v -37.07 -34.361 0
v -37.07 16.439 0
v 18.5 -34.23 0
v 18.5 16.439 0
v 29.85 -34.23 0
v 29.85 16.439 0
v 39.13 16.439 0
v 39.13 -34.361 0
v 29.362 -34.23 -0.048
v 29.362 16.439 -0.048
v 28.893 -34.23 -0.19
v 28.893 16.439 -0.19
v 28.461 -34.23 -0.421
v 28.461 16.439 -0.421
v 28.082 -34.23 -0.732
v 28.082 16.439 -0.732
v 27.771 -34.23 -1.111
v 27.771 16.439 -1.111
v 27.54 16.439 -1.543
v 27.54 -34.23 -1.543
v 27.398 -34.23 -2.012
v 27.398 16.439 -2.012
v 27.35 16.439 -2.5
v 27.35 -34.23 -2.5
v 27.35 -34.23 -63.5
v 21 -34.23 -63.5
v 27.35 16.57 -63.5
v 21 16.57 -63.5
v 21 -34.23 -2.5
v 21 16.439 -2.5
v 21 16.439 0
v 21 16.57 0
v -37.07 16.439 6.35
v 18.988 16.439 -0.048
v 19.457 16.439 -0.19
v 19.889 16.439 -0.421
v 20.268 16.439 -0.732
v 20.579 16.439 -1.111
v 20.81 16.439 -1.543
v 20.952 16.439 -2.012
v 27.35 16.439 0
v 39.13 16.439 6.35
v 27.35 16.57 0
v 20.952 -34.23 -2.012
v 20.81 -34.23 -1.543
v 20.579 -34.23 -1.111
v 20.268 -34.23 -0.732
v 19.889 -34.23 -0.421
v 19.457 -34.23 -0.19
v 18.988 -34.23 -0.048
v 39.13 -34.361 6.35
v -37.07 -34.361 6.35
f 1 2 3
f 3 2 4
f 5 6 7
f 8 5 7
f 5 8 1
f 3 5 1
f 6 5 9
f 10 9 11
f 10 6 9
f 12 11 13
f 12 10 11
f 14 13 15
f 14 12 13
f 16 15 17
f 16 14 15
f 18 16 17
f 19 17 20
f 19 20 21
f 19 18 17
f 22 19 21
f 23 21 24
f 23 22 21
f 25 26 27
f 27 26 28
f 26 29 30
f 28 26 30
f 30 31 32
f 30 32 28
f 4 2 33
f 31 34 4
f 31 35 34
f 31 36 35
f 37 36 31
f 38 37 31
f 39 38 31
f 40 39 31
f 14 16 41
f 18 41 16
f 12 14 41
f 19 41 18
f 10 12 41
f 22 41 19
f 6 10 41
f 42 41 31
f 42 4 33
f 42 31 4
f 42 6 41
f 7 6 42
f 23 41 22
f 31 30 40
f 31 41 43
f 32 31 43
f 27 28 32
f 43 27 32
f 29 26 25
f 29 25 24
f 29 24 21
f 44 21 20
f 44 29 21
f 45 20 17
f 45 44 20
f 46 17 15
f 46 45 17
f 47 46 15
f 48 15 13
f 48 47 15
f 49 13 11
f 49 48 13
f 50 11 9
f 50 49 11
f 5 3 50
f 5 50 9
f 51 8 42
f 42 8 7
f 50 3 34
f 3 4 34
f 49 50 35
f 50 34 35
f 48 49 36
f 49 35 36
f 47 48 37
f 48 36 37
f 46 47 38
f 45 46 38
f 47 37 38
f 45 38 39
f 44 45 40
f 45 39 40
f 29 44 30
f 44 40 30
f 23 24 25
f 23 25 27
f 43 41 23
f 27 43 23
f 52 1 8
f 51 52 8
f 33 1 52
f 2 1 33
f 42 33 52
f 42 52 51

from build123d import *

# Parameters (mm, degrees)
F0_W     = 76.2
F0_H     = 50.8
F1_DEPTH = 6.35
F3_W     = 50.8
F3_H     = 63.5
F4_DEPTH = 6.35
F5_R     = 2.5


with BuildPart() as f1:
    # F0 (on Top) → F1 (new body)
    with BuildSketch(Plane.XY):
        with Locations((1.0298034176, -8.9605891951)):
            Rectangle(F0_W, F0_H)
    extrude(amount=F1_DEPTH)

    # F3 (on offset) → F4 (join)
    with BuildSketch(Plane.YZ.offset(21)):
        with Locations((-8.8295020819, -31.75)):
            Rectangle(F3_W, F3_H)
    extrude(amount=F4_DEPTH)

    # F5
    f5_edges = [f1.edges().sort_by_distance(p)[0] for p in [
        (21, -8.895046, 0),
        (27.35, -8.895046, 0),
    ]]
    fillet(f5_edges, radius=F5_R)


solid = f1.part
